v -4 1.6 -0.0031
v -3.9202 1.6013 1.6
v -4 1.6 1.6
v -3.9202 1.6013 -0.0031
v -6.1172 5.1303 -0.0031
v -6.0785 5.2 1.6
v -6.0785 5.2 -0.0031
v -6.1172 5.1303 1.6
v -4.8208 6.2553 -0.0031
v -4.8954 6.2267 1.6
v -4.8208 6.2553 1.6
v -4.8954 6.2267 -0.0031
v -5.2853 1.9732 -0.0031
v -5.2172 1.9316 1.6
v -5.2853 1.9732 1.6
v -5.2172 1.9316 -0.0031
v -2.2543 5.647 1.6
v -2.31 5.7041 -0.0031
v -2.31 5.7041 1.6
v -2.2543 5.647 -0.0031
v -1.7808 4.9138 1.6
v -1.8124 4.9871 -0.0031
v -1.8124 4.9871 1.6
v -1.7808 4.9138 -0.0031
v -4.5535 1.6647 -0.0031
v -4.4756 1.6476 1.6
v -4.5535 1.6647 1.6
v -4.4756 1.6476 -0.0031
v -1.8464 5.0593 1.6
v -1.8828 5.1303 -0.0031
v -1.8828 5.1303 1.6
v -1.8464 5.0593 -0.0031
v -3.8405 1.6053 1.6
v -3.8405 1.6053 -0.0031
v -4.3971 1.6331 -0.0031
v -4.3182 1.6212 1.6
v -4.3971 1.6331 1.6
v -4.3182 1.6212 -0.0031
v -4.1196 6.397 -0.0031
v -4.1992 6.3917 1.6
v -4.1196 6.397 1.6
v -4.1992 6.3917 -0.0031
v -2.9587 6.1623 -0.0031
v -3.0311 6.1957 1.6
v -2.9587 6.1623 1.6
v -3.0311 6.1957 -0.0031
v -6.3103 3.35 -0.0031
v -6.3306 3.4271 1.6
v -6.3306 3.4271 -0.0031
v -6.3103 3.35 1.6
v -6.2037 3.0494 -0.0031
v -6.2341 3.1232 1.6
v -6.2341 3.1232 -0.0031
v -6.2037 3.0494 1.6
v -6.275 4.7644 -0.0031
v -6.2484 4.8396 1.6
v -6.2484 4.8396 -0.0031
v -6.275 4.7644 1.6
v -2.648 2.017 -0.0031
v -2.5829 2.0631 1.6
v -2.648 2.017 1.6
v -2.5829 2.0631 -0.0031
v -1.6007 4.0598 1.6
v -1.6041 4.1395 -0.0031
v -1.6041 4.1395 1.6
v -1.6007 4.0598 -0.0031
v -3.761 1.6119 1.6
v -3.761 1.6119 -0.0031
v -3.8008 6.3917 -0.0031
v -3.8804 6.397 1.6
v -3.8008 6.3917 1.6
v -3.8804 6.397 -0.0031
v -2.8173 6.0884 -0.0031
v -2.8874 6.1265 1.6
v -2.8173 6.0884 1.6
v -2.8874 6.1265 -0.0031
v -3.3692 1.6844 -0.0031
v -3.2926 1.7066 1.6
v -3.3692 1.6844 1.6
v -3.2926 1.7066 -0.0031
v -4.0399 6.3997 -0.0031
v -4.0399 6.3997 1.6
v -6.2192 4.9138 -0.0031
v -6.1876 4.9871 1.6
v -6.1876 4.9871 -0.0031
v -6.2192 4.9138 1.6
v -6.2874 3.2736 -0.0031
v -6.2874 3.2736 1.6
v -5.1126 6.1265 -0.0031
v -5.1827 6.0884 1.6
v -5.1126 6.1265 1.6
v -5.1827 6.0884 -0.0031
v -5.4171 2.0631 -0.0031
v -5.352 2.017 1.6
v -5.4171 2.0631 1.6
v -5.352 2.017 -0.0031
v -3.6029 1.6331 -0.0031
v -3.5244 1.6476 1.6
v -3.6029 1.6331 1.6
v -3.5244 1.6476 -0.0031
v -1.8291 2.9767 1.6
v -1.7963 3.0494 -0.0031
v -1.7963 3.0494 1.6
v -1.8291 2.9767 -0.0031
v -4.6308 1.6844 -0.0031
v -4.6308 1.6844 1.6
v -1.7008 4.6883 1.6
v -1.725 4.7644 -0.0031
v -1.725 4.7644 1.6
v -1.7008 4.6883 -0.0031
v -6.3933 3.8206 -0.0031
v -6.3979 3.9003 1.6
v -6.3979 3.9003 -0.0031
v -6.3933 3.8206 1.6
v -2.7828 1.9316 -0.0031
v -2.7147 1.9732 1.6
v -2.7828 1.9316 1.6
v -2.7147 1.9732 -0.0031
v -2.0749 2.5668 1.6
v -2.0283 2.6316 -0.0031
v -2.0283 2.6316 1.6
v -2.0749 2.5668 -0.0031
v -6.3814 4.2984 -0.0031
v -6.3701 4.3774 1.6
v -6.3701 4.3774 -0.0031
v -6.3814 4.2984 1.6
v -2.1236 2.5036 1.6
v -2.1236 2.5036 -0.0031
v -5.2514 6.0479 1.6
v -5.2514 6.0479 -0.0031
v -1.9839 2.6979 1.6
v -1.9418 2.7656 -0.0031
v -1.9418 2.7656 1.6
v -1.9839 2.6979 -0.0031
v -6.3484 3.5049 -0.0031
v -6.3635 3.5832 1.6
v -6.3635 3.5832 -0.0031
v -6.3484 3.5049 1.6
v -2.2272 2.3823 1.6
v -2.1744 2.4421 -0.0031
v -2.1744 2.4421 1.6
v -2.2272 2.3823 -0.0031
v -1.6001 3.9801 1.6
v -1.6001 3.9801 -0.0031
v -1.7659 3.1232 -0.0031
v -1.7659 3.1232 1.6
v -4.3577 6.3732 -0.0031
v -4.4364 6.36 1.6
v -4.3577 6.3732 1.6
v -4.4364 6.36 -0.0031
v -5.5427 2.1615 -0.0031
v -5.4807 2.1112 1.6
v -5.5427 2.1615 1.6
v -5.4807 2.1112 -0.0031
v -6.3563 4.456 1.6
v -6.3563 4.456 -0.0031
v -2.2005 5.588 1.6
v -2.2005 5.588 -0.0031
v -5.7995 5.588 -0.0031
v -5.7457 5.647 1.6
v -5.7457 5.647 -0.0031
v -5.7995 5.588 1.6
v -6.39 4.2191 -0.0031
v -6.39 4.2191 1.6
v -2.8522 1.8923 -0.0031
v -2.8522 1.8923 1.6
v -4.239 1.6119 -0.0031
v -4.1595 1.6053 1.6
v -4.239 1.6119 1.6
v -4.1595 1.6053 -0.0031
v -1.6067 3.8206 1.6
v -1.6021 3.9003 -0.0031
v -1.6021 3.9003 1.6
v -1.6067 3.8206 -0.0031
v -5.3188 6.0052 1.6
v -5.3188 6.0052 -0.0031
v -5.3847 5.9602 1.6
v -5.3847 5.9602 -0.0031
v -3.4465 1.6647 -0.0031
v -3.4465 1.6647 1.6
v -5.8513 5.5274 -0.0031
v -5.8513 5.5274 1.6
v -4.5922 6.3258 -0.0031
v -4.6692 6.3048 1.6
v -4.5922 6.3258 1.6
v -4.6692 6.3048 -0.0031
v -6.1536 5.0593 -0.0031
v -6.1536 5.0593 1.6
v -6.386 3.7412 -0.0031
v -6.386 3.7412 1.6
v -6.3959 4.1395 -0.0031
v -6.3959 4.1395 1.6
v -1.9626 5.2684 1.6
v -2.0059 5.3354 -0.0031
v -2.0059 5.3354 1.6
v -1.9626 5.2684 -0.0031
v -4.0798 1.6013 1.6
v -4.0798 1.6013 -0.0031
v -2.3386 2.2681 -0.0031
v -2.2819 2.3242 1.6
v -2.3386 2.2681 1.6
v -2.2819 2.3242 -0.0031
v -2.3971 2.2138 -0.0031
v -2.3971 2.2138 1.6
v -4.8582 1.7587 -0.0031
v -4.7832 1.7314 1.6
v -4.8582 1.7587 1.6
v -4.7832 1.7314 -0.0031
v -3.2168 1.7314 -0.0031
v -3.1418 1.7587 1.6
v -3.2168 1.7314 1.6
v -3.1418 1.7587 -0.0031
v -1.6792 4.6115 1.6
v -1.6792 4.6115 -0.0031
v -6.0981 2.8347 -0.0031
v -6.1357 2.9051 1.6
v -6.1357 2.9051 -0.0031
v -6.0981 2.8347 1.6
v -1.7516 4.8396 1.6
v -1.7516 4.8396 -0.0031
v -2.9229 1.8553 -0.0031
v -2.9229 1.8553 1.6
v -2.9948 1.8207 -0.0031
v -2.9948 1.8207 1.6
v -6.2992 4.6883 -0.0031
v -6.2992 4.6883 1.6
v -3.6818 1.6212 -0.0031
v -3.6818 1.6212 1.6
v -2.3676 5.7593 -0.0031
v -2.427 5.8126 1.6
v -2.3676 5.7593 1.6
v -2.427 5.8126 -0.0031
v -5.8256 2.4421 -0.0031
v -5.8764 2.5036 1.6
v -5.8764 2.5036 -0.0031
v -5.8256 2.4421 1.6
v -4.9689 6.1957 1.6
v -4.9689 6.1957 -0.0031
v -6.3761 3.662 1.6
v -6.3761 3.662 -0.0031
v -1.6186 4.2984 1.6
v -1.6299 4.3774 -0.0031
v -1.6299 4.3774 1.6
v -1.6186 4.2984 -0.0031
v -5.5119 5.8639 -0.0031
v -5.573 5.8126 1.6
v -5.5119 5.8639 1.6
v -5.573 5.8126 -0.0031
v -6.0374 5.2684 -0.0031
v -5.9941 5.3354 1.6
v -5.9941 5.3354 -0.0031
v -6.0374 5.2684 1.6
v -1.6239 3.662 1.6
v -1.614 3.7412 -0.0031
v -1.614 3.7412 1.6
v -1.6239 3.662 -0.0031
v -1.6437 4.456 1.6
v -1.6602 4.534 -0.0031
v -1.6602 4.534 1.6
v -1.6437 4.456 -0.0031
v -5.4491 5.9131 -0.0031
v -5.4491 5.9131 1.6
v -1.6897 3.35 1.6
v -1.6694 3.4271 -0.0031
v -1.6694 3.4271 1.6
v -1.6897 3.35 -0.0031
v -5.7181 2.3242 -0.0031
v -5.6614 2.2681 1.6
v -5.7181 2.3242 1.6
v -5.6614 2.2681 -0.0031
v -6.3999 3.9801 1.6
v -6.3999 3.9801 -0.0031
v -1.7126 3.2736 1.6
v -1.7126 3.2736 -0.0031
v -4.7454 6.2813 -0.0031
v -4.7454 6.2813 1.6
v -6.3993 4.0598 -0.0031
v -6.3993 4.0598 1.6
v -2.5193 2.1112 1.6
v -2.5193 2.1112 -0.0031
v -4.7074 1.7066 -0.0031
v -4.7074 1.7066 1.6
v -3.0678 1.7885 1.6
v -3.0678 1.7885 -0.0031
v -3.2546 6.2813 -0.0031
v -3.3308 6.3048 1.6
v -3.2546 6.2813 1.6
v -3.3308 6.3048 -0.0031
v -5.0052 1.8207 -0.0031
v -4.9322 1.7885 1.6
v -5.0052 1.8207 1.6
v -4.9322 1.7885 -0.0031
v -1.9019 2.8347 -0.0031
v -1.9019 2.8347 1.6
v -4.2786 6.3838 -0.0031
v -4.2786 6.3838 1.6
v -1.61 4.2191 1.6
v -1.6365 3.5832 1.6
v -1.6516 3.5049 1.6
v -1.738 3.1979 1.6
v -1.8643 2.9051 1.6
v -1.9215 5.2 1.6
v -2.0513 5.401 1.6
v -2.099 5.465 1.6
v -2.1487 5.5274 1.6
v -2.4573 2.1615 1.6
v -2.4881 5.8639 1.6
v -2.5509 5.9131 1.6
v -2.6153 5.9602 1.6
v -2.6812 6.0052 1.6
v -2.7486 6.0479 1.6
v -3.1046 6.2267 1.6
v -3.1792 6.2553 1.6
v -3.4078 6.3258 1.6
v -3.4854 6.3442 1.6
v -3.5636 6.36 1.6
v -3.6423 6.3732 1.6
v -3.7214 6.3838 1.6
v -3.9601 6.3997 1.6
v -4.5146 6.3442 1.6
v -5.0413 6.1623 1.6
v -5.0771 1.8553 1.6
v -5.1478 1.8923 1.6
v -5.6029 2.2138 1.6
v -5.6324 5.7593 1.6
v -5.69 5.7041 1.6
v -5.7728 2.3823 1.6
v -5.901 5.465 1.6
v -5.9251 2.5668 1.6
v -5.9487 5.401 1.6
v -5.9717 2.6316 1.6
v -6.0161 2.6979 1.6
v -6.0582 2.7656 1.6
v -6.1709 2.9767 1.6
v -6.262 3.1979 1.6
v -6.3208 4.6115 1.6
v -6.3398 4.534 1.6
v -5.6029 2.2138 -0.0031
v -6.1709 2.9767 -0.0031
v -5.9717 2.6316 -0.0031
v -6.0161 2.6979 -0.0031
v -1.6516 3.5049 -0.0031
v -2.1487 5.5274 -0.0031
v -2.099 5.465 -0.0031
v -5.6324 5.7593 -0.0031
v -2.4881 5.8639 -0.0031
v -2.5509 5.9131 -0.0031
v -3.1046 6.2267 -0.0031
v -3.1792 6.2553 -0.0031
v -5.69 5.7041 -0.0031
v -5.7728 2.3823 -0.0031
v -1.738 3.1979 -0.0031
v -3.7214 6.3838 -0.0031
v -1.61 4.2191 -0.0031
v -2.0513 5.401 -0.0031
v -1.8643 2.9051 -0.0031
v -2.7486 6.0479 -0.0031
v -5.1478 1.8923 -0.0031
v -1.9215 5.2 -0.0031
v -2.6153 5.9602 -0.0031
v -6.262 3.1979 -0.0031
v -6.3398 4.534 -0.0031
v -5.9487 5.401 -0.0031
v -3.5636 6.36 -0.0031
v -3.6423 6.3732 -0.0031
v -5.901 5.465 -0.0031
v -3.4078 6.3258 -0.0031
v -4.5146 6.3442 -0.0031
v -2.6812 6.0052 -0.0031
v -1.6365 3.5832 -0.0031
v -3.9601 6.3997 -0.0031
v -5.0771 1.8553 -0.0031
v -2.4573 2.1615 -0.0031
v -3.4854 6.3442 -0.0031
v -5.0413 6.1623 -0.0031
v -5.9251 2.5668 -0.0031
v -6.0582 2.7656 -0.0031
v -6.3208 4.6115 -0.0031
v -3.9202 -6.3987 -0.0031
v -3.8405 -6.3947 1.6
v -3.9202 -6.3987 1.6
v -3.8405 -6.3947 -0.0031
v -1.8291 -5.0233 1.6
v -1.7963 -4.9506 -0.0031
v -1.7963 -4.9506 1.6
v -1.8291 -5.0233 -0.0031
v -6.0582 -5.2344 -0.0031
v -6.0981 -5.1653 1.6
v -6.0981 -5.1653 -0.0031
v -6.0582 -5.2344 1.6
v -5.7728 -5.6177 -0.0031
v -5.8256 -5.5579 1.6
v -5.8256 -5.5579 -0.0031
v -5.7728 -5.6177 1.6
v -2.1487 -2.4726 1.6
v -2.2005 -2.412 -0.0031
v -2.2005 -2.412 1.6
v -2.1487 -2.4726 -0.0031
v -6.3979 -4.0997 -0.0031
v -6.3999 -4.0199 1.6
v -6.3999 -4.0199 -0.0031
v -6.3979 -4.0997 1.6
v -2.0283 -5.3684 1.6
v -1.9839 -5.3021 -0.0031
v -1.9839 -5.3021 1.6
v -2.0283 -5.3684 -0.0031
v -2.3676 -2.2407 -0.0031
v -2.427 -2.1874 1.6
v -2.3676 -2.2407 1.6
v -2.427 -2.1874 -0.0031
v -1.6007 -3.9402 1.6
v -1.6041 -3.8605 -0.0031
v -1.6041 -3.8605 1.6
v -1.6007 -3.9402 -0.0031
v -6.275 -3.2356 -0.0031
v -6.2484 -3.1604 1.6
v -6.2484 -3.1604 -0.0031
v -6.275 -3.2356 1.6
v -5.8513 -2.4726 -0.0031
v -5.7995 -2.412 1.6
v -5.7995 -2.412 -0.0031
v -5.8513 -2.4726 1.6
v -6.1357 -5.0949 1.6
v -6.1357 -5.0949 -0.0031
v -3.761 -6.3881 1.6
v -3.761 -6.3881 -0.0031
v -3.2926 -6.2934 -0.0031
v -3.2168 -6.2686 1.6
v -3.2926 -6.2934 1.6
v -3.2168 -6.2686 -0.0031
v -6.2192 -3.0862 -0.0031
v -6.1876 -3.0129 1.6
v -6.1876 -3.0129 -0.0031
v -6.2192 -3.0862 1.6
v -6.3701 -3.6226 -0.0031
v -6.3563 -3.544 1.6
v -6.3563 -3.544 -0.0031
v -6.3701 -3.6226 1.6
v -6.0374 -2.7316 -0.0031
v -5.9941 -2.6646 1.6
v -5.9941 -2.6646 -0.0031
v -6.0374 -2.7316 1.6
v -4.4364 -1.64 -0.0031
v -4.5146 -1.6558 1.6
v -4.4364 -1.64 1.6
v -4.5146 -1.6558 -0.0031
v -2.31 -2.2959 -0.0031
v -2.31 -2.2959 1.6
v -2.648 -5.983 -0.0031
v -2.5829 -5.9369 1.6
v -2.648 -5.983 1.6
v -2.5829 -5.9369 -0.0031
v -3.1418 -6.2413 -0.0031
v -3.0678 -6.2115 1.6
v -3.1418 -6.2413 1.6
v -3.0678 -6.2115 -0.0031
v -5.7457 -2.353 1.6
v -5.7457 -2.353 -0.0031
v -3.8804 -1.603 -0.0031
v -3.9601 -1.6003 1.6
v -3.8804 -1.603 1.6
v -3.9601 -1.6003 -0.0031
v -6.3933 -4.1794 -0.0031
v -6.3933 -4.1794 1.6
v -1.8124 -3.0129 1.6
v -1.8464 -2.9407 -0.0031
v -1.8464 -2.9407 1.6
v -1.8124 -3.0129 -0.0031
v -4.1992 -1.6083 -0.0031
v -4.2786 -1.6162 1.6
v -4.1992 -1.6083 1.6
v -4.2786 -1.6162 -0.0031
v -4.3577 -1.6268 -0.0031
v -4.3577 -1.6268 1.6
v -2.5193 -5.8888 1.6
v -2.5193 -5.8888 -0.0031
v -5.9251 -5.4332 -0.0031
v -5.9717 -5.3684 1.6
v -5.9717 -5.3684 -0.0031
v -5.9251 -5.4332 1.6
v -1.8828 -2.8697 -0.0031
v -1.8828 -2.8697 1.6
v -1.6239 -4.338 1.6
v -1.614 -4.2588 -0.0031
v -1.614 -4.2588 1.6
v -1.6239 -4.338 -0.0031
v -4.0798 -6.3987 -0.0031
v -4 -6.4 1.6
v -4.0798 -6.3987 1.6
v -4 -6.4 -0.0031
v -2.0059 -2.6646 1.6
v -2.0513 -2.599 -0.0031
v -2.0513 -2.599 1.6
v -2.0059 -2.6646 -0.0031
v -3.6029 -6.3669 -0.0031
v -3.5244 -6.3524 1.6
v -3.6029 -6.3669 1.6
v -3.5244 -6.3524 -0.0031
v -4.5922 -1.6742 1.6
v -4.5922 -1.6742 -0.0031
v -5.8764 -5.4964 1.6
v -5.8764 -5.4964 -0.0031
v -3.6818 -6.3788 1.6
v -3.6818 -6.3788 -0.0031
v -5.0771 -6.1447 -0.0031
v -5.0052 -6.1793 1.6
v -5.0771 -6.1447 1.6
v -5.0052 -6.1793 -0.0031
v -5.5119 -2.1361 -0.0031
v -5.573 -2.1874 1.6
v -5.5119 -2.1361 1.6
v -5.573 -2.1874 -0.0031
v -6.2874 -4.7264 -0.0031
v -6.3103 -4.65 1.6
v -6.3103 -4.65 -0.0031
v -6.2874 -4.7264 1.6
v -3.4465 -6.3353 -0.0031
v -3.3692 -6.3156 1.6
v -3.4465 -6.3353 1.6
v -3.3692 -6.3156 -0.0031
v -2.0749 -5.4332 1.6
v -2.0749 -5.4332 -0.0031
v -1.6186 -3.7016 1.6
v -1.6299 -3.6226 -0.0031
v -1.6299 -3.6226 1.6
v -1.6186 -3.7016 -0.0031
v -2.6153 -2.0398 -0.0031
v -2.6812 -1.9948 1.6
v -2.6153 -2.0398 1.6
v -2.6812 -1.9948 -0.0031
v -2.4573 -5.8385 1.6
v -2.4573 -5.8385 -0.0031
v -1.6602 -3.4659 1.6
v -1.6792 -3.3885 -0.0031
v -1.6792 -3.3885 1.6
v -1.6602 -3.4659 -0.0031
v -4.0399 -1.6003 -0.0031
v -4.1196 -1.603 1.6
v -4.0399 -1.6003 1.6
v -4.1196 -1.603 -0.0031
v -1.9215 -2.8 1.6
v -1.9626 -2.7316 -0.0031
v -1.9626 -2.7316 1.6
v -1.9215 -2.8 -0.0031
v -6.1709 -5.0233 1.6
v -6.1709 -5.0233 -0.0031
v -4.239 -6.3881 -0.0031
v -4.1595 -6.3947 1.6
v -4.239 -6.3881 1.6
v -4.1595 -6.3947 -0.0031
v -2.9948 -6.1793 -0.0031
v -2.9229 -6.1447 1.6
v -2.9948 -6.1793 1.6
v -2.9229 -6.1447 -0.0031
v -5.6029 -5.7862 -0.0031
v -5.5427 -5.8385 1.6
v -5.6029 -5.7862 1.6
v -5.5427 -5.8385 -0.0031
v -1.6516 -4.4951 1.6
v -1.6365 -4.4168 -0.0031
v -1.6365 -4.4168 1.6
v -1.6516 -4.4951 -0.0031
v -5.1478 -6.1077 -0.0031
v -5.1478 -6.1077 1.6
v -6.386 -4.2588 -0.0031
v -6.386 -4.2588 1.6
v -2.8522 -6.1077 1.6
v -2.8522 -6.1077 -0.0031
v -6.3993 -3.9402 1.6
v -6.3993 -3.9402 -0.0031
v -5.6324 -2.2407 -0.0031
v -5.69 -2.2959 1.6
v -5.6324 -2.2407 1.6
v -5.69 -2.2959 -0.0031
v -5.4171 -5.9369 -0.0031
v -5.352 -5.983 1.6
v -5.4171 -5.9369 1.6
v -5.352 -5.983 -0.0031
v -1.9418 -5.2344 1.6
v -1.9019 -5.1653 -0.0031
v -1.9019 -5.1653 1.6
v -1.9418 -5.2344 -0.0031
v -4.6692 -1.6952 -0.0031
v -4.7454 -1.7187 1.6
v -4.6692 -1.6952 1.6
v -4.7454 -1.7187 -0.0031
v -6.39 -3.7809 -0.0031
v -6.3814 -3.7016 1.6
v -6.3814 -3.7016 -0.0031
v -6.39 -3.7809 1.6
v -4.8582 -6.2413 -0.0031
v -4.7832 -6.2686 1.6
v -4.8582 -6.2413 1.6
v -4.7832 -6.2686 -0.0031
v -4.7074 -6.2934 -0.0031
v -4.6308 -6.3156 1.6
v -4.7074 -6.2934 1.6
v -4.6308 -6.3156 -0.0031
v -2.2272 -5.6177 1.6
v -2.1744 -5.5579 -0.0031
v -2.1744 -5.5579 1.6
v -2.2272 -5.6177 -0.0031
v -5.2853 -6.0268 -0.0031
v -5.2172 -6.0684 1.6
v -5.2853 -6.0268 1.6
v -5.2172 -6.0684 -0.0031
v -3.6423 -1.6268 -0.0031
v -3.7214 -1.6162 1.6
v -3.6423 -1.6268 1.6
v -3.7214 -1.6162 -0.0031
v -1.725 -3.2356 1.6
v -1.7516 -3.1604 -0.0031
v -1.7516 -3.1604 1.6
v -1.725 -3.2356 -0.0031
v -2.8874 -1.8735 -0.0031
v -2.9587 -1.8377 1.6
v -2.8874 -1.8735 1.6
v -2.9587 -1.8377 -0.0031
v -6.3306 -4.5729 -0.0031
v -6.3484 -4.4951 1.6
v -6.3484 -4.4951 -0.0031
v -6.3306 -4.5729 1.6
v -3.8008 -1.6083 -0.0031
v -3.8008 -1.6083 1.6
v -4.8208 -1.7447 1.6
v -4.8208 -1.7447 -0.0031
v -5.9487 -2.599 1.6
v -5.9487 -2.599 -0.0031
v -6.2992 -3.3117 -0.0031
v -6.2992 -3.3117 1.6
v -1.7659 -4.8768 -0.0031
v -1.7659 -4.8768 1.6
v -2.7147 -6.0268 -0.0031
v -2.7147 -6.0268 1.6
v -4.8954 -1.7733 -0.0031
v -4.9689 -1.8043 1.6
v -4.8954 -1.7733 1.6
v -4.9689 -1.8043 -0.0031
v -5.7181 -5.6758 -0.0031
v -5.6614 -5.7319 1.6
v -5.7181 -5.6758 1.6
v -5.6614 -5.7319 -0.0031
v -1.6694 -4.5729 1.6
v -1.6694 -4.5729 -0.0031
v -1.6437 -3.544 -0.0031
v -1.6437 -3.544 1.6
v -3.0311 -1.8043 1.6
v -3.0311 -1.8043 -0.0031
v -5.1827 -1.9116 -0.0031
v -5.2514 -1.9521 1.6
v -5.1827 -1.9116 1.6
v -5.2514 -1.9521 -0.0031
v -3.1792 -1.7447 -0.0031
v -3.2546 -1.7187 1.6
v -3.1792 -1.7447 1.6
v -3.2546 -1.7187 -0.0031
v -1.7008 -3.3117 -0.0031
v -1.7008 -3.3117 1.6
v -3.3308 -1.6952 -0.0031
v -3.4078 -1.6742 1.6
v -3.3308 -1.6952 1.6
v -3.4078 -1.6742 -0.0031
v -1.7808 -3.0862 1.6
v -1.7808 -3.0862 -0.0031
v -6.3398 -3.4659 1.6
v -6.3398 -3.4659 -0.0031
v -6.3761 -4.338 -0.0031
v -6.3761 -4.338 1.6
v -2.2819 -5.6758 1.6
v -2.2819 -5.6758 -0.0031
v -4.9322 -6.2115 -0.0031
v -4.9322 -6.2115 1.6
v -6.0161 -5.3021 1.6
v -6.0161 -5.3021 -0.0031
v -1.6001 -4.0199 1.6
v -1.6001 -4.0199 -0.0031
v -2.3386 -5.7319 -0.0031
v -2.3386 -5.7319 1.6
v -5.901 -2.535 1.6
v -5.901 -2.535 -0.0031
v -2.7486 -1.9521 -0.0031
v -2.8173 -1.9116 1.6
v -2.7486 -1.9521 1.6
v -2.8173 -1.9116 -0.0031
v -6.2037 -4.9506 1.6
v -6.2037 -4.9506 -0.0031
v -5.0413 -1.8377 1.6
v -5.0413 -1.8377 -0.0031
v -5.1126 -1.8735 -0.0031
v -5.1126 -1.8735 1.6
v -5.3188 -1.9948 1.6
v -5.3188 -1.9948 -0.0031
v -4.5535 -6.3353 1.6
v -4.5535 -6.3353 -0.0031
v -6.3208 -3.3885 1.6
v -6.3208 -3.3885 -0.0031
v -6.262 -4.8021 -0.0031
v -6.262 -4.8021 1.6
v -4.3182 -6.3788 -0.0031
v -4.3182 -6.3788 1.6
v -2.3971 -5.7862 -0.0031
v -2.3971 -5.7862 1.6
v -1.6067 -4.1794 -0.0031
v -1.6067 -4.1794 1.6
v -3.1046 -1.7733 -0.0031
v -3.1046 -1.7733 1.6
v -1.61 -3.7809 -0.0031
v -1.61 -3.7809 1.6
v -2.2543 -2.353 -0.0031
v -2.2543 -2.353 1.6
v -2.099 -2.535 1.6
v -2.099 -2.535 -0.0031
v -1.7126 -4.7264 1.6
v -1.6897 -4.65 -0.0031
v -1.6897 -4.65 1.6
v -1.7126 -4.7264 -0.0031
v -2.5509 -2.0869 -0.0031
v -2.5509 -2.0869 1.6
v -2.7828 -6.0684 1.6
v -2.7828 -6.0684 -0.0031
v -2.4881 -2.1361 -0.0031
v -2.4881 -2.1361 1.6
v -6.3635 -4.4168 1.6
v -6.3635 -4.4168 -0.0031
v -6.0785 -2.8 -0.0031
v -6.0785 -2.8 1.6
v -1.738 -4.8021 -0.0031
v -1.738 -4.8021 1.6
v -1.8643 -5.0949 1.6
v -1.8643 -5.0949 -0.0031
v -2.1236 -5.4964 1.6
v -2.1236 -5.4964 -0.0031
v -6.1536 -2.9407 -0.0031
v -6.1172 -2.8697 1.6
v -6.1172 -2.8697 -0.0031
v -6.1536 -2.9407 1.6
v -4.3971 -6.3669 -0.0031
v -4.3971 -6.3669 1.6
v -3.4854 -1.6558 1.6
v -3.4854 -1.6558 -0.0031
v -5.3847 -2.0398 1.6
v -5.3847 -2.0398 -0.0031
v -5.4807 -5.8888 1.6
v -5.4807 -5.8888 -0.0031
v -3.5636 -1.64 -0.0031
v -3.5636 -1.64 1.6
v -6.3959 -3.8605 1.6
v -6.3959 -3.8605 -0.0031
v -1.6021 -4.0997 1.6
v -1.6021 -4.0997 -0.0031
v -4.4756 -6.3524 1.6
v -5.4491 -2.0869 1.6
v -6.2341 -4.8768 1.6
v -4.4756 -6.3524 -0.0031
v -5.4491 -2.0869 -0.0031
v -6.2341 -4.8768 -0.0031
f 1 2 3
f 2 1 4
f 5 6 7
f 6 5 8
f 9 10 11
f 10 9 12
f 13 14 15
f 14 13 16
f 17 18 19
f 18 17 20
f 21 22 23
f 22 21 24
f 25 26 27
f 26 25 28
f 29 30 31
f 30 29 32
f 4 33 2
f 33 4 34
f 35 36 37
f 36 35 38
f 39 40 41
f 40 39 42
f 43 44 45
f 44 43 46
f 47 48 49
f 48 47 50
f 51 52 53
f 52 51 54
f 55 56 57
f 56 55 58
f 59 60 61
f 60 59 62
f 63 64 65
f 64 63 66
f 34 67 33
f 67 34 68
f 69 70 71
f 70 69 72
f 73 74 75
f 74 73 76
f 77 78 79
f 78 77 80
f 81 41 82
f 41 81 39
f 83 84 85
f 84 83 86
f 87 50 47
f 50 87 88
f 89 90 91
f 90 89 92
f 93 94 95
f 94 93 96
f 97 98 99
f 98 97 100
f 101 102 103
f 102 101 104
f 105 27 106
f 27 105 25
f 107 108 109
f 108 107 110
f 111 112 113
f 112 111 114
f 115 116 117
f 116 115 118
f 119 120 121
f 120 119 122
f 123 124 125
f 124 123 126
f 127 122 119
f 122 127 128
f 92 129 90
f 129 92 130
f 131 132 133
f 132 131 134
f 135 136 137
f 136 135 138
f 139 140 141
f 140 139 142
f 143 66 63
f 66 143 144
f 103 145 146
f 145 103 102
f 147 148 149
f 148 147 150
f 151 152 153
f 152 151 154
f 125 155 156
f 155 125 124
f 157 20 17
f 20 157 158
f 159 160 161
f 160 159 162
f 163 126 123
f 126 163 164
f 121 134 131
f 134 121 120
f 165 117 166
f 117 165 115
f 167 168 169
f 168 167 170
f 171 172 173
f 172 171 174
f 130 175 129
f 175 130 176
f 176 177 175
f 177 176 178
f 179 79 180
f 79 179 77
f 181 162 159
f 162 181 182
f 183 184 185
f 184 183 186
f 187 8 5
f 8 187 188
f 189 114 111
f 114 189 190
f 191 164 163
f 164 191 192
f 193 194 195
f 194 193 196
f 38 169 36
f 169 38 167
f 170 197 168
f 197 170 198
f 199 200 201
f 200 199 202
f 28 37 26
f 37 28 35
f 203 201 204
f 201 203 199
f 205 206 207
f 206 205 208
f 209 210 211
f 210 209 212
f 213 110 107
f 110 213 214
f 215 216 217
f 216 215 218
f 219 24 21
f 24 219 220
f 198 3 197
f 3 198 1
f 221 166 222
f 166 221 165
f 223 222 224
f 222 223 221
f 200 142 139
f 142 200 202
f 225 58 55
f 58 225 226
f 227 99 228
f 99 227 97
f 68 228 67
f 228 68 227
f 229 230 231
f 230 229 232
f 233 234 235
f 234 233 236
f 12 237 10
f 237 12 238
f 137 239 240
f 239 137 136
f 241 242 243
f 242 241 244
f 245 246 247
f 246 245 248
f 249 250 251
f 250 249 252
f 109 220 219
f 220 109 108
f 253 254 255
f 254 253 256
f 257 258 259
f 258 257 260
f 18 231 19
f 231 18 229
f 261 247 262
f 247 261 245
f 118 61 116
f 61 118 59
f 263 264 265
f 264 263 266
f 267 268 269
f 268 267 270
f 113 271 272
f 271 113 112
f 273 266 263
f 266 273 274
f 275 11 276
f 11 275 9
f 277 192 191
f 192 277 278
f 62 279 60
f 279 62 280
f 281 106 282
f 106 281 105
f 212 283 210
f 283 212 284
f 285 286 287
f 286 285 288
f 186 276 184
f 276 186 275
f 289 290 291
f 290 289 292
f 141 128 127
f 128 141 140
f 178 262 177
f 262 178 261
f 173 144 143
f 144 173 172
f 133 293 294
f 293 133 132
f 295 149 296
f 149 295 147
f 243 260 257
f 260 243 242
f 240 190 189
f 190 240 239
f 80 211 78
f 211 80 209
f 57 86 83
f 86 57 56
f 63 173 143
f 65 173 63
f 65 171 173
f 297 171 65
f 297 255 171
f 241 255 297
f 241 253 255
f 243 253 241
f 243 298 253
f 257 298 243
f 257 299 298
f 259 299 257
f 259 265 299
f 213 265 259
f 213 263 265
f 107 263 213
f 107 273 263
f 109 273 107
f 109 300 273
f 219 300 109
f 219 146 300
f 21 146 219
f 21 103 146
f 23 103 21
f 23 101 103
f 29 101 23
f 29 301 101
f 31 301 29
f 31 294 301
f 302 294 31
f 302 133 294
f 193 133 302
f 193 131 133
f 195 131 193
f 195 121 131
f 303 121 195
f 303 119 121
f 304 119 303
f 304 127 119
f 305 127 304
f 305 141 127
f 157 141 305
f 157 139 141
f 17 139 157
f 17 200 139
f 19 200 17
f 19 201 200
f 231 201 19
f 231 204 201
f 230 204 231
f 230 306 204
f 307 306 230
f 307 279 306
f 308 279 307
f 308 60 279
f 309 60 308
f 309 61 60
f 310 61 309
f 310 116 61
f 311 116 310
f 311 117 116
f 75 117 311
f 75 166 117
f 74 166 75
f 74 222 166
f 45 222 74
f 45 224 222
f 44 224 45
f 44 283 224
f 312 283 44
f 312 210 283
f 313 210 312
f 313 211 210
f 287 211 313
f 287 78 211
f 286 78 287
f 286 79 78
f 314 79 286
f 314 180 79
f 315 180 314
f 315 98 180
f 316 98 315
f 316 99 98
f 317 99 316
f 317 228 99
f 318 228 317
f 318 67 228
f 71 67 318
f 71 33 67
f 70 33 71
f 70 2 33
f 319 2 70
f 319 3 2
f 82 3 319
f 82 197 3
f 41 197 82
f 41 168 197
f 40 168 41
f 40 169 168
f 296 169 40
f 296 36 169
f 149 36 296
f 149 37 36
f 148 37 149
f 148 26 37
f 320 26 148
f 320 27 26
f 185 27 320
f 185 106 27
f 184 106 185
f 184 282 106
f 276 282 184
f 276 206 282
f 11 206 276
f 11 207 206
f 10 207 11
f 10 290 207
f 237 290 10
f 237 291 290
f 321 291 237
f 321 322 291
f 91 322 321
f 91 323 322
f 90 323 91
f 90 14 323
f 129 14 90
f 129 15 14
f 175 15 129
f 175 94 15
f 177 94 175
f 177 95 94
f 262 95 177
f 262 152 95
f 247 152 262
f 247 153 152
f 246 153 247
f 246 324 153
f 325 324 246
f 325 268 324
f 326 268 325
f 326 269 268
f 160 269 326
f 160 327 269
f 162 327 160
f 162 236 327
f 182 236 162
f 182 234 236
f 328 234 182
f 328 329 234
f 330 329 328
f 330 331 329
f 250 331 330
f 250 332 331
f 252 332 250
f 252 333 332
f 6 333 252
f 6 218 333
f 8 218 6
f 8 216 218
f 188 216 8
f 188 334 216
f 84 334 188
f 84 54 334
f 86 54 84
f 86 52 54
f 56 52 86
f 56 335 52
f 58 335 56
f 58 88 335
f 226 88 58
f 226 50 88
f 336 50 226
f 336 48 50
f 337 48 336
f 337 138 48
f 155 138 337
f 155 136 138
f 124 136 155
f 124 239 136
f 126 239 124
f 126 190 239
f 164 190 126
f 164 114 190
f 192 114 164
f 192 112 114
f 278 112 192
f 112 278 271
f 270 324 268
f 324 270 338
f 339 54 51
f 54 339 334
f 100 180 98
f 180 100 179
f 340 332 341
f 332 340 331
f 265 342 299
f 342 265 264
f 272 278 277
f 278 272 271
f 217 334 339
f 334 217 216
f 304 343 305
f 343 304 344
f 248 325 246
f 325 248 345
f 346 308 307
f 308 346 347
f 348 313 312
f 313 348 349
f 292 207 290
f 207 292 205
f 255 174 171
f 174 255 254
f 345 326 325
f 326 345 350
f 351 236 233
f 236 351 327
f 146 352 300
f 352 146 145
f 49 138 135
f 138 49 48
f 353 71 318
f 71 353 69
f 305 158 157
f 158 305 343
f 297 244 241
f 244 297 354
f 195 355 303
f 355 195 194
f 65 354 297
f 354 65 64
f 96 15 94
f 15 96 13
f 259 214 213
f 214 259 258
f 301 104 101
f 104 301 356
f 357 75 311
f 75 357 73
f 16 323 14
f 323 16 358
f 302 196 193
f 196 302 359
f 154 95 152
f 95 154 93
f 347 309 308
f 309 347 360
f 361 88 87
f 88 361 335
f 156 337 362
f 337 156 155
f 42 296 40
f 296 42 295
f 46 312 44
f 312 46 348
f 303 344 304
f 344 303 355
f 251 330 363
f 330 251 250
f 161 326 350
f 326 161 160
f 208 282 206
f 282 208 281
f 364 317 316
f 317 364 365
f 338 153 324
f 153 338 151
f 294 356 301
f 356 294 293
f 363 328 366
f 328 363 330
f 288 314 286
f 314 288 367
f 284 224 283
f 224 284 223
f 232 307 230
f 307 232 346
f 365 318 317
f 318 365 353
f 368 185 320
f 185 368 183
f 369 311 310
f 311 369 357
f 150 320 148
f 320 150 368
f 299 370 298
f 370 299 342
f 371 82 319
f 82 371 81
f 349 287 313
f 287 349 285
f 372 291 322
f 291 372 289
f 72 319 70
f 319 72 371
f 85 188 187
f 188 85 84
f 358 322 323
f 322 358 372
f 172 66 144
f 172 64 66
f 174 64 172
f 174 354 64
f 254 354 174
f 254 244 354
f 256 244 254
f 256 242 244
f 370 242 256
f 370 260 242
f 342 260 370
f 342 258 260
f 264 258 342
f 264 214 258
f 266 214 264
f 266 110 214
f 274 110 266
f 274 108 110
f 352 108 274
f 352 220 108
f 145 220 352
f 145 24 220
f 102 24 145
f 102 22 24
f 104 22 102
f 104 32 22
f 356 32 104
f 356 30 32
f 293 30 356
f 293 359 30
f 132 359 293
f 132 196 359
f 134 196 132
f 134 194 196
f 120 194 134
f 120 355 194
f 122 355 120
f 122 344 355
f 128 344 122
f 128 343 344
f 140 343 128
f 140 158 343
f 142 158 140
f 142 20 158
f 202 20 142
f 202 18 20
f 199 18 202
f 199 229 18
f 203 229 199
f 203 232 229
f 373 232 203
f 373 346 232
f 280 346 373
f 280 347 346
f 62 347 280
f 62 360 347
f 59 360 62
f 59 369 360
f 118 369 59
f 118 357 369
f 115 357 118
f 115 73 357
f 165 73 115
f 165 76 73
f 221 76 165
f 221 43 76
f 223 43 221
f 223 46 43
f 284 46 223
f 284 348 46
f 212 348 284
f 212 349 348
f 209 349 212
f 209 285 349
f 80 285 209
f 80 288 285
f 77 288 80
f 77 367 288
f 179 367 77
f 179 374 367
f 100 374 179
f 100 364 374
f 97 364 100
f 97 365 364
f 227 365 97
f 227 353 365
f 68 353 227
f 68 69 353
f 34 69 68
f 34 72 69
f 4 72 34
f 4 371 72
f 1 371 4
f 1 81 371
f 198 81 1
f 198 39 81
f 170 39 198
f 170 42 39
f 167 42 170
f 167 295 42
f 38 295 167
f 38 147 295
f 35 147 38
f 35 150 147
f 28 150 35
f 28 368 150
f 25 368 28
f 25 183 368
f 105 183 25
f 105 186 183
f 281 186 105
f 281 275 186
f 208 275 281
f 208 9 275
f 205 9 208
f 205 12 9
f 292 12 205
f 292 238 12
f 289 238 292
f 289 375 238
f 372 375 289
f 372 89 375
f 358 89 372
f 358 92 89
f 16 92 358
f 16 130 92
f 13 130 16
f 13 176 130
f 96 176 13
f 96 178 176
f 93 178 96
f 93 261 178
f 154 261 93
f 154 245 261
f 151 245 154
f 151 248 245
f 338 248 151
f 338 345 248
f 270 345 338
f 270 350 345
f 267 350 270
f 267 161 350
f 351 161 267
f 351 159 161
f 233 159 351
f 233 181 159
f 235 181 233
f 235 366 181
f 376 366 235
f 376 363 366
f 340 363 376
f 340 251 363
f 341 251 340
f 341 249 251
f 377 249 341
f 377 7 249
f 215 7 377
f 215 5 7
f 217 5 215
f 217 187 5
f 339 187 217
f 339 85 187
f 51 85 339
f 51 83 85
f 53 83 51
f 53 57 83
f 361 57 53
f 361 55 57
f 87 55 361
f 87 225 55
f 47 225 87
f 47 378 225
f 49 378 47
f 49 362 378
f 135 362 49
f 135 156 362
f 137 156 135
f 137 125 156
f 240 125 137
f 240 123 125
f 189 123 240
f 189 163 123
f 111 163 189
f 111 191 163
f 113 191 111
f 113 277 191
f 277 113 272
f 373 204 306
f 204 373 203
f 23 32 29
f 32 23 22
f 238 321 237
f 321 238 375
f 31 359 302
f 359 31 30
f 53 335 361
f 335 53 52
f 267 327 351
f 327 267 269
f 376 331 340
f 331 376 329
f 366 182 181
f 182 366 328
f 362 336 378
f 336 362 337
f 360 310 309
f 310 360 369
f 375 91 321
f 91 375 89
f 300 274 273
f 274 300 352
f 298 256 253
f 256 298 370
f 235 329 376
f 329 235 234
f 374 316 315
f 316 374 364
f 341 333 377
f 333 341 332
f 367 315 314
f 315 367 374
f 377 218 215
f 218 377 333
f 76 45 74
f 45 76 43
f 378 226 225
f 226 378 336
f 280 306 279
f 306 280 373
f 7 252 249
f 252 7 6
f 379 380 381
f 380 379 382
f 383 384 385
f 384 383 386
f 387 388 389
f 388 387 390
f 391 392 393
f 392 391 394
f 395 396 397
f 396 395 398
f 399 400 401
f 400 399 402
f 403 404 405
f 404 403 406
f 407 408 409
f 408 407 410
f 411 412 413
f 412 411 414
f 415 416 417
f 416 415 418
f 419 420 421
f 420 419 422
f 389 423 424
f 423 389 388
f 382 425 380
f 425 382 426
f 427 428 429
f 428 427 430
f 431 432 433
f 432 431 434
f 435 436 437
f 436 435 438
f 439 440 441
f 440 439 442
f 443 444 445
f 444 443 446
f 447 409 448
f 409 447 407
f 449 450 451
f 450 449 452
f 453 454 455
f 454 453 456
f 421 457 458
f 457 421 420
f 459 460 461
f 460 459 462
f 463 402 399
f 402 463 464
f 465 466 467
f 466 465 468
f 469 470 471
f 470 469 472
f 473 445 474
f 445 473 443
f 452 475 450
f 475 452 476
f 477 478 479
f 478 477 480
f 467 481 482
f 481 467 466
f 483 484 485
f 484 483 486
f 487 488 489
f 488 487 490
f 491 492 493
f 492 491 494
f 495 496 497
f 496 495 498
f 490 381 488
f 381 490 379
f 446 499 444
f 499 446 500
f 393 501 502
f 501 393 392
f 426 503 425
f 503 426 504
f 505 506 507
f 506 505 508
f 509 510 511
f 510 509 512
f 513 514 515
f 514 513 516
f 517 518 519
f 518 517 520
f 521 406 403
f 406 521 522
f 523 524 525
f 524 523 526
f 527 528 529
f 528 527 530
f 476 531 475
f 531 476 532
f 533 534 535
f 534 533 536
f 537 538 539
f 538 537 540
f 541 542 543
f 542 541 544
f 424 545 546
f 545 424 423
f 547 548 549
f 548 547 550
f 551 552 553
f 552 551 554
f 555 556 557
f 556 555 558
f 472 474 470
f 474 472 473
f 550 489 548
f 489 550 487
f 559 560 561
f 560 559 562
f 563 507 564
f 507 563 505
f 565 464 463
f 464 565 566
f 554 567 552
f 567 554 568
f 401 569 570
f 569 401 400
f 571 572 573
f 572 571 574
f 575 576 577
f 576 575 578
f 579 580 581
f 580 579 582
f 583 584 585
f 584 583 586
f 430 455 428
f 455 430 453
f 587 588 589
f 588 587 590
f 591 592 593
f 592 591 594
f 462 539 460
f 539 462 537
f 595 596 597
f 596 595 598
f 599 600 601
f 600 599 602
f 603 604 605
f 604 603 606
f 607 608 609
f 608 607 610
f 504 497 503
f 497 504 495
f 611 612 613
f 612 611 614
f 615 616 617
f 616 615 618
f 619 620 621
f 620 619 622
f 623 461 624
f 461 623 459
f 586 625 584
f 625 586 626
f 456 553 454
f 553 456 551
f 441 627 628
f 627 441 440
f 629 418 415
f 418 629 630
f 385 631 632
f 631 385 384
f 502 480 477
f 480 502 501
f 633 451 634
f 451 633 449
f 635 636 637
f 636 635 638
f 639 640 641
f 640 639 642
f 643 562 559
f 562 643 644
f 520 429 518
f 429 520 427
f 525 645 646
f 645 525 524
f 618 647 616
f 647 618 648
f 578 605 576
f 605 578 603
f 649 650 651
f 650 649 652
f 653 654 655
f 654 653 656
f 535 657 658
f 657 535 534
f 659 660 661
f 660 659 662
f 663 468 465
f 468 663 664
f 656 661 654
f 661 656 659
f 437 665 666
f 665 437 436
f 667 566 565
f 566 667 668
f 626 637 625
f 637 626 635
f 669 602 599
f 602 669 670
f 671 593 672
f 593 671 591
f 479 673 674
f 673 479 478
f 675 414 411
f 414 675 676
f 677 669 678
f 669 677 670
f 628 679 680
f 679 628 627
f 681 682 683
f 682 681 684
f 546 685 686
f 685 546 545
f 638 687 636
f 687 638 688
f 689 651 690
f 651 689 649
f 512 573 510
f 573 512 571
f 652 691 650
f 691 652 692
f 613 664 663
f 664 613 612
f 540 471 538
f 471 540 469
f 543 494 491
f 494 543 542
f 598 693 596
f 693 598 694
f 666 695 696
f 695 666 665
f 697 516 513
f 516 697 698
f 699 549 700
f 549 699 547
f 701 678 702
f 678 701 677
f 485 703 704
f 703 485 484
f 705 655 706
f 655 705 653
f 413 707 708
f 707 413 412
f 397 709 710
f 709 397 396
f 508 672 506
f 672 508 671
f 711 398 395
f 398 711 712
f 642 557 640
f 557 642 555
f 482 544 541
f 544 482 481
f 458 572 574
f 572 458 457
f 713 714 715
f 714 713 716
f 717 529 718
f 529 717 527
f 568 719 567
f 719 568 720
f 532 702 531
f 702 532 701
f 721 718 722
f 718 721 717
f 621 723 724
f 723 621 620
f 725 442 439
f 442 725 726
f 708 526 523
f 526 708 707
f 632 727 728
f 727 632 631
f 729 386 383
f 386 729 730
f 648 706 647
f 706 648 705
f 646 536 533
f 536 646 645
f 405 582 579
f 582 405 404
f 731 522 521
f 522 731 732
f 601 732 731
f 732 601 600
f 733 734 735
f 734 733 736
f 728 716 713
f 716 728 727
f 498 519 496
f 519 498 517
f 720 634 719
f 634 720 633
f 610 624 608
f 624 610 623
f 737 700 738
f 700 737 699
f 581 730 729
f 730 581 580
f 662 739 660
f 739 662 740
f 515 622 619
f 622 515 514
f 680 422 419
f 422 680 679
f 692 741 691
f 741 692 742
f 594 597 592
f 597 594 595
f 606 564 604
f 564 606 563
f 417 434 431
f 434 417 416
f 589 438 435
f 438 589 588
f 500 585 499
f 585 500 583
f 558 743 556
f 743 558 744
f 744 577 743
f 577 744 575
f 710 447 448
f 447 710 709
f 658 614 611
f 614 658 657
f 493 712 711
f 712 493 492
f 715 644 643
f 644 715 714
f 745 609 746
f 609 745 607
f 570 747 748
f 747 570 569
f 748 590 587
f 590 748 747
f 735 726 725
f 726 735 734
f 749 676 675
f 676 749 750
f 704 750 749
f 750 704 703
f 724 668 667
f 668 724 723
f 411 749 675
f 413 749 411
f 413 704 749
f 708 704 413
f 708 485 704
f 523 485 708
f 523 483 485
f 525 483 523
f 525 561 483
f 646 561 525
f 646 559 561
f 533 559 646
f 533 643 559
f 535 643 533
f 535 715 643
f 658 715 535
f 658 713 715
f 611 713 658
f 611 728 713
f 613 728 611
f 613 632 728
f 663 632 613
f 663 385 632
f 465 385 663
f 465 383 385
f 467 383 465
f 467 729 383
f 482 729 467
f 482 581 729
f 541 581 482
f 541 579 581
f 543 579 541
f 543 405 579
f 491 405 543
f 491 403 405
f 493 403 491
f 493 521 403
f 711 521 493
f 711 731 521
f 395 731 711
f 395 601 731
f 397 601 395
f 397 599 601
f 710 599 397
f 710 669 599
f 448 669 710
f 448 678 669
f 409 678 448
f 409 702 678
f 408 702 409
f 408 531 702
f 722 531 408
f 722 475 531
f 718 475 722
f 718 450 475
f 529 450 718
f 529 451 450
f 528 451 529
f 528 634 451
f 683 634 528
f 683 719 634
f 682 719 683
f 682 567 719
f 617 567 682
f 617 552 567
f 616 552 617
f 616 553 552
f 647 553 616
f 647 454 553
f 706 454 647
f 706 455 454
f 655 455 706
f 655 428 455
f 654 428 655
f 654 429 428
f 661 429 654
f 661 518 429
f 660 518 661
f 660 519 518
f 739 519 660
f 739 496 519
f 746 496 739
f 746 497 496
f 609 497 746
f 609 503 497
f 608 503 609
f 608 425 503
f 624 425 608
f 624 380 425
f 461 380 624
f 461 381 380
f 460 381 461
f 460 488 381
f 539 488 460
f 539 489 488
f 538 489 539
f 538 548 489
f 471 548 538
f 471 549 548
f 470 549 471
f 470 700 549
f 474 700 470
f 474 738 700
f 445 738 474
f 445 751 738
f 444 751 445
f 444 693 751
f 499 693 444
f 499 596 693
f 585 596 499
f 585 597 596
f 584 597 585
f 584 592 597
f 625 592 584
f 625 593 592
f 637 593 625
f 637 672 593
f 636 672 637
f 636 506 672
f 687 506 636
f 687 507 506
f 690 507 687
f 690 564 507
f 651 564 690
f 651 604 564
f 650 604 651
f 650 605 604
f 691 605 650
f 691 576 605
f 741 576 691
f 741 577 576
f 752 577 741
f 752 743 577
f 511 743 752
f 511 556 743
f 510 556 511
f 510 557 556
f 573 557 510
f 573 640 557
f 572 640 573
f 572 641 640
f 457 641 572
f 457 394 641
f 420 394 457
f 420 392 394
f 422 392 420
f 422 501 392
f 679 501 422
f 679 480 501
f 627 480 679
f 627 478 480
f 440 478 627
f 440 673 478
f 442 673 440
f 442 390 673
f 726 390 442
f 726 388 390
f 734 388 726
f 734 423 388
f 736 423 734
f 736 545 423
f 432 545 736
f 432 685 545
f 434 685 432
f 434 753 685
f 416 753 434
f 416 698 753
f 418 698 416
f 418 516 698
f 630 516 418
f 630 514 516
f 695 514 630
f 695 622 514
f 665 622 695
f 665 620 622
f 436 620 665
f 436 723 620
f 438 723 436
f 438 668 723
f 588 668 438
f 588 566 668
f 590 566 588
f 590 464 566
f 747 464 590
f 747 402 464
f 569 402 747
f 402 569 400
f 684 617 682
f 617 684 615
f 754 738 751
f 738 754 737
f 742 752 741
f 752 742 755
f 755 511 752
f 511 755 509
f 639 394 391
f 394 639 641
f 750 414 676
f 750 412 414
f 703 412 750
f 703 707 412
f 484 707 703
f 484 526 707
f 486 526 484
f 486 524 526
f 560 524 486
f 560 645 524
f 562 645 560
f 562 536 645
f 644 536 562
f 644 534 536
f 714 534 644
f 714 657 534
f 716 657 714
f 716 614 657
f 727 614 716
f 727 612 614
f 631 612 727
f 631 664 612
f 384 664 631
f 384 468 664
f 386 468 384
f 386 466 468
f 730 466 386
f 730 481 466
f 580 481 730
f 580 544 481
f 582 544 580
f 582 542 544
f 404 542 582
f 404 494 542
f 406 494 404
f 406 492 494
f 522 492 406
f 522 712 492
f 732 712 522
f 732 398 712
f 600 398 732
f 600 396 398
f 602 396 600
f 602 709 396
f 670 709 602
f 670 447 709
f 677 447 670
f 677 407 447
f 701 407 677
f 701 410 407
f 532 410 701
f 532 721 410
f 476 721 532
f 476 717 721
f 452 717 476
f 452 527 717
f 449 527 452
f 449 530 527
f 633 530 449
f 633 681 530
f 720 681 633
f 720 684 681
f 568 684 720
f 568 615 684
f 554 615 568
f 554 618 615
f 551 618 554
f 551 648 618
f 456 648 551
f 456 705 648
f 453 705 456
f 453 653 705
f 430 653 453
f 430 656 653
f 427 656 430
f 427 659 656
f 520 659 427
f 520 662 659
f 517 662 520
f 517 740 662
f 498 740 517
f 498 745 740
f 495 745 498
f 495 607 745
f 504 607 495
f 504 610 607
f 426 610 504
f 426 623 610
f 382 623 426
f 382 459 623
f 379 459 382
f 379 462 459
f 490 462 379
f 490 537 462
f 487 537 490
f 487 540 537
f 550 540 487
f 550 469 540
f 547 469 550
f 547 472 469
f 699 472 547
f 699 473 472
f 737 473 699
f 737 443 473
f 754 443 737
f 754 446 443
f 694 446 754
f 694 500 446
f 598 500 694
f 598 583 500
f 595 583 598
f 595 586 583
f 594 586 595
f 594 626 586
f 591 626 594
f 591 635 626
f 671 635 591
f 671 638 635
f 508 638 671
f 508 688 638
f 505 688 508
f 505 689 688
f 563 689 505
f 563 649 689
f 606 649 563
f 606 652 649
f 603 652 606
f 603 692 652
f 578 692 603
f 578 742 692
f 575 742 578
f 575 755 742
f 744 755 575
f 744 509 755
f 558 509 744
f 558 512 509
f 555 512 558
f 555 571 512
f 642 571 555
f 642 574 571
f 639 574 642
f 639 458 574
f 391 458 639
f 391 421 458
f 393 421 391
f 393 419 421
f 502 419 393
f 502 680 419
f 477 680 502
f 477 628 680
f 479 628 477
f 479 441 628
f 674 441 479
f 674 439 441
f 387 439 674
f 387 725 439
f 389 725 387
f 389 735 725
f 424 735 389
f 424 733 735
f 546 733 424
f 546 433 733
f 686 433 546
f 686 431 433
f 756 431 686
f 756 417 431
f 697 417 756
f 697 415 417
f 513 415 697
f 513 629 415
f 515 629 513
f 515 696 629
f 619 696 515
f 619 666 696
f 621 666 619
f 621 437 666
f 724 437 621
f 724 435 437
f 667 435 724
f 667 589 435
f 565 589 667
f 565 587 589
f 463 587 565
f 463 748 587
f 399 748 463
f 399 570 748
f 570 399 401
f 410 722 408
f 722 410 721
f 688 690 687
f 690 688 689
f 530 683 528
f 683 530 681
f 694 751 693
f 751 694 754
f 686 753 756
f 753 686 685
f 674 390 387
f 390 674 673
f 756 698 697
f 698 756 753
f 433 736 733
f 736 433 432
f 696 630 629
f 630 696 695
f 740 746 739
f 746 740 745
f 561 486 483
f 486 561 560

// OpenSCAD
use <../lib.scad>
use <58124.scad>
use <58125b.scad>
use <s/58124s03.scad>
$fa=1; $fs=0.2;
function ldraw_lib__58124c02(realsolid=false) = [
// 0 Electric Power Functions Connector with 9V Bottom
// 0 Name: 58124c02.dat
// 0 Author: Philippe Hurbain [Philo]
// 0 !LDRAW_ORG Part UPDATE 2012-01
// 0 !LICENSE Licensed under CC BY 2.0 and CC BY 4.0 : see CAreadme.txt
// 
// 0 BFC CERTIFY CW
  [0,"BFC","CERTIFY"],
  [0,"BFC","CW"],
// 
// 0 !HISTORY 2012-03-30 [PTadmin] Official Update 2012-01
// 
// 
// 1 16 0 0 0 1 0 0 0 1 0 0 0 1 58124.dat
  [1,16,0,0,0,1,0,0,0,1,0,0,0,1, ldraw_lib__58124(realsolid)],
// 1 0 0 0 0 1 0 0 0 1 0 0 0 1 58125b.dat
  [1,0,0,0,0,1,0,0,0,1,0,0,0,1, ldraw_lib__58125b(realsolid)],
// 1 0 30 7 0 0 -4 0 1 0 0 0 0 1 s\58124s03.dat
  [1,0,30,7,0,0,-4,0,1,0,0,0,0,1, ldraw_lib__s__58124s03(realsolid)],
// 
];
module ldraw_lib__58124c02(step=0, col=false, unit=2/5, alt=false, line=0.2, solid=!$preview)
    makepoly(ldraw_lib__58124c02(solid), step=step, col=col, unit=unit, alt=alt, line=line, solid=solid);
ldraw_lib__58124c02(line=0.2);
